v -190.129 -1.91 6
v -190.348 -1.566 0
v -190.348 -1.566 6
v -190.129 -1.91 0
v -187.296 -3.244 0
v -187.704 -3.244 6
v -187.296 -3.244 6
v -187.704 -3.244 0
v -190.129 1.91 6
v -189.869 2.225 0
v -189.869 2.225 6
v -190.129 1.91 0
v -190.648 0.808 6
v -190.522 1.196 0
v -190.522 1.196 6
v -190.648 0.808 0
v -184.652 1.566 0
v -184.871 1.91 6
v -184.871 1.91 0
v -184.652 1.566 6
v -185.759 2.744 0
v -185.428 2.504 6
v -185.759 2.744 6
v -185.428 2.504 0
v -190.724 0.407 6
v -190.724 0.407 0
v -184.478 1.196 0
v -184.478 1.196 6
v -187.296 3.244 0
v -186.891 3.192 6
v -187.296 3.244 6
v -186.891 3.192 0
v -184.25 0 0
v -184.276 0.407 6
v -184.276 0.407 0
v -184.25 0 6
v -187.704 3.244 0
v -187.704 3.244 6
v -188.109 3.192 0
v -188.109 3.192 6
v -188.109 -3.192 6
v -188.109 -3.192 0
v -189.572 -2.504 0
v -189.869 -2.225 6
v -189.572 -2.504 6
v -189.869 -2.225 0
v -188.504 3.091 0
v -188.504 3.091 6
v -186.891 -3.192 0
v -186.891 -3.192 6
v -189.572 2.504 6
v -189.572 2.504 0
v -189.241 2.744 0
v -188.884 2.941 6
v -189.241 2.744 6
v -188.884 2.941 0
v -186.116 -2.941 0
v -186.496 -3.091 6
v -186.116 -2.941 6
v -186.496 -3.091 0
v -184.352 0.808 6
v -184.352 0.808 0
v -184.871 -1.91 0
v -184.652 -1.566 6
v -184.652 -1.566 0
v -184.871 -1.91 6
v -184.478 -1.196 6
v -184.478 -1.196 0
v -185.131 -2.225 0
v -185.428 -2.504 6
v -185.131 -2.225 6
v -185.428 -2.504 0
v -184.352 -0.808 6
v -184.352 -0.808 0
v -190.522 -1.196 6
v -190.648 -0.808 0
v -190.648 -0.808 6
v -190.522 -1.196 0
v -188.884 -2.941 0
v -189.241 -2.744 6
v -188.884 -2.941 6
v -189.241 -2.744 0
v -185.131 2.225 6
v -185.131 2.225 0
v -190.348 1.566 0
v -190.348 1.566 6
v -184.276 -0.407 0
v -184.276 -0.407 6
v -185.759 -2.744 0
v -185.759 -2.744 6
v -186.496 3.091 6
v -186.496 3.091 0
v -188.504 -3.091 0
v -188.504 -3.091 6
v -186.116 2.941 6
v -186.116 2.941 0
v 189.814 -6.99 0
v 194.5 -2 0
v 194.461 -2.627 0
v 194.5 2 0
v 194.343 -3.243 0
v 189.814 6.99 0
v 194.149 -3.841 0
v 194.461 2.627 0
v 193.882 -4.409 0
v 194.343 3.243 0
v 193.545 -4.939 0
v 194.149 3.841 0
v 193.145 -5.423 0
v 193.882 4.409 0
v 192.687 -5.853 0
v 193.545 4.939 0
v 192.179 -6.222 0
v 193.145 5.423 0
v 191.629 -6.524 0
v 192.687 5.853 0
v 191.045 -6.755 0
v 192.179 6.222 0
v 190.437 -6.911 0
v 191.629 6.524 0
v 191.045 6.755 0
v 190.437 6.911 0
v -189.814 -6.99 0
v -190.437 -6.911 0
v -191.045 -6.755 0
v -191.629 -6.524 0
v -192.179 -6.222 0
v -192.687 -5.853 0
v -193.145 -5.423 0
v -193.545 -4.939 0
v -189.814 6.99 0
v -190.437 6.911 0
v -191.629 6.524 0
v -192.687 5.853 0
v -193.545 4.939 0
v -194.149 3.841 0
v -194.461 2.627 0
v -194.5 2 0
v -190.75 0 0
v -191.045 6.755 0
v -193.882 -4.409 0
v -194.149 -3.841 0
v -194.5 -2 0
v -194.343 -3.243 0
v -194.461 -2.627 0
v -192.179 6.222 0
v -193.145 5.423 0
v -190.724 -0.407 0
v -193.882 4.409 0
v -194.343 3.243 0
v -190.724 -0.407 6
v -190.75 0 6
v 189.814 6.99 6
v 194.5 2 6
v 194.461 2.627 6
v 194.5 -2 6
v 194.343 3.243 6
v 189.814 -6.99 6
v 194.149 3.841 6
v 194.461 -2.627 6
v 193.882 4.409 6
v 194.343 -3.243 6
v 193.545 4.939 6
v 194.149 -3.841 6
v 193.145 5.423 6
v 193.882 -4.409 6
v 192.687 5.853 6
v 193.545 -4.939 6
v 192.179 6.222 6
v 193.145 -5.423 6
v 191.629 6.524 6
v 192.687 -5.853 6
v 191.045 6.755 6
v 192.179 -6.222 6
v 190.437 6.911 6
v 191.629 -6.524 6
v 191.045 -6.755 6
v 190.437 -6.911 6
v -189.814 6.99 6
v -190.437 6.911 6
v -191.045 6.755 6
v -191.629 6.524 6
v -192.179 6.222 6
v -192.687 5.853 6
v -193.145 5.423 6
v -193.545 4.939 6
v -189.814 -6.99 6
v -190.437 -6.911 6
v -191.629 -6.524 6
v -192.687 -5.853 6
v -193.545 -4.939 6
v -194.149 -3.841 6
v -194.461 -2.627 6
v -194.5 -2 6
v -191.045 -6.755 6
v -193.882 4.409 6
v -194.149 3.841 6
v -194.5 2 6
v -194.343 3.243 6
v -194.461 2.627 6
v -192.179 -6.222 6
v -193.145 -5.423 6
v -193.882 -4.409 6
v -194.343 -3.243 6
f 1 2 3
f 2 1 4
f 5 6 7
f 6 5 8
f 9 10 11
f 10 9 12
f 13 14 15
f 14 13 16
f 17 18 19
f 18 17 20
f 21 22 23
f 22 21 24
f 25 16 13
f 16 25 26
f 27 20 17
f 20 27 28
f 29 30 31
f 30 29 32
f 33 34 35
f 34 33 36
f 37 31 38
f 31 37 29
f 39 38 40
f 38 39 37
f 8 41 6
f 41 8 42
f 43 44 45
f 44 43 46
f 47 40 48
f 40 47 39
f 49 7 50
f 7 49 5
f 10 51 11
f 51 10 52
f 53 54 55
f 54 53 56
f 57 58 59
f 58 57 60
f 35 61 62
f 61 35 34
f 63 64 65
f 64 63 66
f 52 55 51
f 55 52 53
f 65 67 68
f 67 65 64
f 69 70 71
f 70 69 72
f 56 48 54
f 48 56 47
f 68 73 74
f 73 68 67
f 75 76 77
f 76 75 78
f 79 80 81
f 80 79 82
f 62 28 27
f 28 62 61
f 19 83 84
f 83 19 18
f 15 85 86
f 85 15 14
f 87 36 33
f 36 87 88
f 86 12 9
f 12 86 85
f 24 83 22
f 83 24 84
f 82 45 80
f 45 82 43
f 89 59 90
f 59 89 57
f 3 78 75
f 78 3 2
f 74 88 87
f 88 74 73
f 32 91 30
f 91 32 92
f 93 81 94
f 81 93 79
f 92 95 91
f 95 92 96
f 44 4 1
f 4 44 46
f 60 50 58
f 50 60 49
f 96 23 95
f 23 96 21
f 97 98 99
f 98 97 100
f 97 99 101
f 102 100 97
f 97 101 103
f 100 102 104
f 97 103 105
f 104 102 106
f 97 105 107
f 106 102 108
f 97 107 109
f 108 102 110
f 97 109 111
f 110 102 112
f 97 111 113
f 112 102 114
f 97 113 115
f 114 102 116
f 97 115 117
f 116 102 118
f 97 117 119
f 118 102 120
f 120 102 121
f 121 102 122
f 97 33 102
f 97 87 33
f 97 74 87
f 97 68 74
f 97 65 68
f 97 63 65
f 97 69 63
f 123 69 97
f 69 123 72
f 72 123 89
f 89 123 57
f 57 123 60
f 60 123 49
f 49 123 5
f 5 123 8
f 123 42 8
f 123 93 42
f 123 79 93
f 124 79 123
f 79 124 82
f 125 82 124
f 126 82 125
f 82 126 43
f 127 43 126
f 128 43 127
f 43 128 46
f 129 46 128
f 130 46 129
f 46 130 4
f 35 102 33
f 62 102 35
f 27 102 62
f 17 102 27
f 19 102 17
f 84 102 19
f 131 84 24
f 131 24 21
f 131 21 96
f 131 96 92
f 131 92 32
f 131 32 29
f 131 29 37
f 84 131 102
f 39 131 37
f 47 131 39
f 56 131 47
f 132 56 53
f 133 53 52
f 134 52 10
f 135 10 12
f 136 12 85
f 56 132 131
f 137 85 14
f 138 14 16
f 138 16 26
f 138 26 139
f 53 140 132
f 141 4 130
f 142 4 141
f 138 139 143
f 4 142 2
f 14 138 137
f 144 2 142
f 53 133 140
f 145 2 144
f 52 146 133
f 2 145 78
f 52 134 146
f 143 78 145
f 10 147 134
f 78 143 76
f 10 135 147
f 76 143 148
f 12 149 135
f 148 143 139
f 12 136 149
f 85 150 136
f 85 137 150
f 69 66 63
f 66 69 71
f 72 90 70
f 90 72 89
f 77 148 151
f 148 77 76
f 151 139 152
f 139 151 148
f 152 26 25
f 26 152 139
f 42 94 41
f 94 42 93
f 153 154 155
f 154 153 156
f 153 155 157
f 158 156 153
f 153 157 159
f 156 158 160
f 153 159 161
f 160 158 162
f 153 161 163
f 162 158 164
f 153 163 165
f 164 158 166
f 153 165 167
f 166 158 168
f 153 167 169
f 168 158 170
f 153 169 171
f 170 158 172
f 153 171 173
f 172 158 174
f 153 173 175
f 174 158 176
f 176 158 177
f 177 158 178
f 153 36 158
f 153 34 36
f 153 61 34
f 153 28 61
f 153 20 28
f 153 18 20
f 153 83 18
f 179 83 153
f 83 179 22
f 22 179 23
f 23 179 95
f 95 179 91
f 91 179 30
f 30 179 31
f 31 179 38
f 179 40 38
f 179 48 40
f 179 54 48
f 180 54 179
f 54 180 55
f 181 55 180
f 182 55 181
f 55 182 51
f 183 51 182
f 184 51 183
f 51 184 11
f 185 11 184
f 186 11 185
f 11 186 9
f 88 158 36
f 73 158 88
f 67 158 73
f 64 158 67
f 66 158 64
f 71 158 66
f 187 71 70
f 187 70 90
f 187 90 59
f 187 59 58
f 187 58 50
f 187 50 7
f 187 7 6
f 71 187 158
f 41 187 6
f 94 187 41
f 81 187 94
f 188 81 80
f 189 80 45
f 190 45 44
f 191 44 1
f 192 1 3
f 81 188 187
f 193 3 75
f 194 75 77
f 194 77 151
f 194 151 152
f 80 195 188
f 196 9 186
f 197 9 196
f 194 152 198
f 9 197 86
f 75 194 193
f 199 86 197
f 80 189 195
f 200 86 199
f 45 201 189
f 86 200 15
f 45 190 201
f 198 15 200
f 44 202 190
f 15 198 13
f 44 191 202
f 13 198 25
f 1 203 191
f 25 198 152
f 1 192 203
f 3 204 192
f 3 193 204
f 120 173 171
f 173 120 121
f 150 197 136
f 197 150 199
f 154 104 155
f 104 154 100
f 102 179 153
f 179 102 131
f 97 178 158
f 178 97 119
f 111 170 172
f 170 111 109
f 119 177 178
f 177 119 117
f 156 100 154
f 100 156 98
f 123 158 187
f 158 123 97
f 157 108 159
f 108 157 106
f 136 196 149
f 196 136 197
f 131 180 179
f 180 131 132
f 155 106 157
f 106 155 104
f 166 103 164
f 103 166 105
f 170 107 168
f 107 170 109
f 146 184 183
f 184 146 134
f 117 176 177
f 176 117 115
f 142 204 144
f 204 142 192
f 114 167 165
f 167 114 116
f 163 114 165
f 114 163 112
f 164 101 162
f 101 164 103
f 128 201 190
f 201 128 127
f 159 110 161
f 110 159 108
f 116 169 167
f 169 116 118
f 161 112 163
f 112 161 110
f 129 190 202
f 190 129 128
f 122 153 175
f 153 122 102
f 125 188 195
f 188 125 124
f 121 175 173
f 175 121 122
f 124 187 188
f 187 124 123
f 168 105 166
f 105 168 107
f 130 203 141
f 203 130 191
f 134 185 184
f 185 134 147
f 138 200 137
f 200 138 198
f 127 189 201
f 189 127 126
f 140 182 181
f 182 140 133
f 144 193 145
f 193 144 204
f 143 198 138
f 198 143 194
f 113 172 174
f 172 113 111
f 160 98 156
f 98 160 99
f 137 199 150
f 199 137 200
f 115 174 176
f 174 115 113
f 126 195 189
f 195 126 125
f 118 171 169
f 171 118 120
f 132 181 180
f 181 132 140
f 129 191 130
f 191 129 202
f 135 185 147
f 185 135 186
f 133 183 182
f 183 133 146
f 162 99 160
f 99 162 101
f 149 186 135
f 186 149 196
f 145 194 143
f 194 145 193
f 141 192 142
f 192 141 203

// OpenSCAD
$fn = 50;


difference() {
	union() {
		hull() {
			translate(v = [-189.5000000000, 2.0000000000, 0]) {
				cylinder(h = 6, r = 5);
			}
			translate(v = [189.5000000000, 2.0000000000, 0]) {
				cylinder(h = 6, r = 5);
			}
			translate(v = [-189.5000000000, -2.0000000000, 0]) {
				cylinder(h = 6, r = 5);
			}
			translate(v = [189.5000000000, -2.0000000000, 0]) {
				cylinder(h = 6, r = 5);
			}
		}
	}
	union() {
		translate(v = [-187.5000000000, 0.0000000000, 0]) {
			cylinder(h = 6, r = 3.2500000000);
		}
		translate(v = [-187.5000000000, 0.0000000000, 0]) {
			cylinder(h = 6, r = 1.8000000000);
		}
		translate(v = [-187.5000000000, 0.0000000000, 0]) {
			cylinder(h = 6, r = 1.8000000000);
		}
		translate(v = [-187.5000000000, 0.0000000000, 0]) {
			cylinder(h = 6, r = 1.8000000000);
		}
	}
}
